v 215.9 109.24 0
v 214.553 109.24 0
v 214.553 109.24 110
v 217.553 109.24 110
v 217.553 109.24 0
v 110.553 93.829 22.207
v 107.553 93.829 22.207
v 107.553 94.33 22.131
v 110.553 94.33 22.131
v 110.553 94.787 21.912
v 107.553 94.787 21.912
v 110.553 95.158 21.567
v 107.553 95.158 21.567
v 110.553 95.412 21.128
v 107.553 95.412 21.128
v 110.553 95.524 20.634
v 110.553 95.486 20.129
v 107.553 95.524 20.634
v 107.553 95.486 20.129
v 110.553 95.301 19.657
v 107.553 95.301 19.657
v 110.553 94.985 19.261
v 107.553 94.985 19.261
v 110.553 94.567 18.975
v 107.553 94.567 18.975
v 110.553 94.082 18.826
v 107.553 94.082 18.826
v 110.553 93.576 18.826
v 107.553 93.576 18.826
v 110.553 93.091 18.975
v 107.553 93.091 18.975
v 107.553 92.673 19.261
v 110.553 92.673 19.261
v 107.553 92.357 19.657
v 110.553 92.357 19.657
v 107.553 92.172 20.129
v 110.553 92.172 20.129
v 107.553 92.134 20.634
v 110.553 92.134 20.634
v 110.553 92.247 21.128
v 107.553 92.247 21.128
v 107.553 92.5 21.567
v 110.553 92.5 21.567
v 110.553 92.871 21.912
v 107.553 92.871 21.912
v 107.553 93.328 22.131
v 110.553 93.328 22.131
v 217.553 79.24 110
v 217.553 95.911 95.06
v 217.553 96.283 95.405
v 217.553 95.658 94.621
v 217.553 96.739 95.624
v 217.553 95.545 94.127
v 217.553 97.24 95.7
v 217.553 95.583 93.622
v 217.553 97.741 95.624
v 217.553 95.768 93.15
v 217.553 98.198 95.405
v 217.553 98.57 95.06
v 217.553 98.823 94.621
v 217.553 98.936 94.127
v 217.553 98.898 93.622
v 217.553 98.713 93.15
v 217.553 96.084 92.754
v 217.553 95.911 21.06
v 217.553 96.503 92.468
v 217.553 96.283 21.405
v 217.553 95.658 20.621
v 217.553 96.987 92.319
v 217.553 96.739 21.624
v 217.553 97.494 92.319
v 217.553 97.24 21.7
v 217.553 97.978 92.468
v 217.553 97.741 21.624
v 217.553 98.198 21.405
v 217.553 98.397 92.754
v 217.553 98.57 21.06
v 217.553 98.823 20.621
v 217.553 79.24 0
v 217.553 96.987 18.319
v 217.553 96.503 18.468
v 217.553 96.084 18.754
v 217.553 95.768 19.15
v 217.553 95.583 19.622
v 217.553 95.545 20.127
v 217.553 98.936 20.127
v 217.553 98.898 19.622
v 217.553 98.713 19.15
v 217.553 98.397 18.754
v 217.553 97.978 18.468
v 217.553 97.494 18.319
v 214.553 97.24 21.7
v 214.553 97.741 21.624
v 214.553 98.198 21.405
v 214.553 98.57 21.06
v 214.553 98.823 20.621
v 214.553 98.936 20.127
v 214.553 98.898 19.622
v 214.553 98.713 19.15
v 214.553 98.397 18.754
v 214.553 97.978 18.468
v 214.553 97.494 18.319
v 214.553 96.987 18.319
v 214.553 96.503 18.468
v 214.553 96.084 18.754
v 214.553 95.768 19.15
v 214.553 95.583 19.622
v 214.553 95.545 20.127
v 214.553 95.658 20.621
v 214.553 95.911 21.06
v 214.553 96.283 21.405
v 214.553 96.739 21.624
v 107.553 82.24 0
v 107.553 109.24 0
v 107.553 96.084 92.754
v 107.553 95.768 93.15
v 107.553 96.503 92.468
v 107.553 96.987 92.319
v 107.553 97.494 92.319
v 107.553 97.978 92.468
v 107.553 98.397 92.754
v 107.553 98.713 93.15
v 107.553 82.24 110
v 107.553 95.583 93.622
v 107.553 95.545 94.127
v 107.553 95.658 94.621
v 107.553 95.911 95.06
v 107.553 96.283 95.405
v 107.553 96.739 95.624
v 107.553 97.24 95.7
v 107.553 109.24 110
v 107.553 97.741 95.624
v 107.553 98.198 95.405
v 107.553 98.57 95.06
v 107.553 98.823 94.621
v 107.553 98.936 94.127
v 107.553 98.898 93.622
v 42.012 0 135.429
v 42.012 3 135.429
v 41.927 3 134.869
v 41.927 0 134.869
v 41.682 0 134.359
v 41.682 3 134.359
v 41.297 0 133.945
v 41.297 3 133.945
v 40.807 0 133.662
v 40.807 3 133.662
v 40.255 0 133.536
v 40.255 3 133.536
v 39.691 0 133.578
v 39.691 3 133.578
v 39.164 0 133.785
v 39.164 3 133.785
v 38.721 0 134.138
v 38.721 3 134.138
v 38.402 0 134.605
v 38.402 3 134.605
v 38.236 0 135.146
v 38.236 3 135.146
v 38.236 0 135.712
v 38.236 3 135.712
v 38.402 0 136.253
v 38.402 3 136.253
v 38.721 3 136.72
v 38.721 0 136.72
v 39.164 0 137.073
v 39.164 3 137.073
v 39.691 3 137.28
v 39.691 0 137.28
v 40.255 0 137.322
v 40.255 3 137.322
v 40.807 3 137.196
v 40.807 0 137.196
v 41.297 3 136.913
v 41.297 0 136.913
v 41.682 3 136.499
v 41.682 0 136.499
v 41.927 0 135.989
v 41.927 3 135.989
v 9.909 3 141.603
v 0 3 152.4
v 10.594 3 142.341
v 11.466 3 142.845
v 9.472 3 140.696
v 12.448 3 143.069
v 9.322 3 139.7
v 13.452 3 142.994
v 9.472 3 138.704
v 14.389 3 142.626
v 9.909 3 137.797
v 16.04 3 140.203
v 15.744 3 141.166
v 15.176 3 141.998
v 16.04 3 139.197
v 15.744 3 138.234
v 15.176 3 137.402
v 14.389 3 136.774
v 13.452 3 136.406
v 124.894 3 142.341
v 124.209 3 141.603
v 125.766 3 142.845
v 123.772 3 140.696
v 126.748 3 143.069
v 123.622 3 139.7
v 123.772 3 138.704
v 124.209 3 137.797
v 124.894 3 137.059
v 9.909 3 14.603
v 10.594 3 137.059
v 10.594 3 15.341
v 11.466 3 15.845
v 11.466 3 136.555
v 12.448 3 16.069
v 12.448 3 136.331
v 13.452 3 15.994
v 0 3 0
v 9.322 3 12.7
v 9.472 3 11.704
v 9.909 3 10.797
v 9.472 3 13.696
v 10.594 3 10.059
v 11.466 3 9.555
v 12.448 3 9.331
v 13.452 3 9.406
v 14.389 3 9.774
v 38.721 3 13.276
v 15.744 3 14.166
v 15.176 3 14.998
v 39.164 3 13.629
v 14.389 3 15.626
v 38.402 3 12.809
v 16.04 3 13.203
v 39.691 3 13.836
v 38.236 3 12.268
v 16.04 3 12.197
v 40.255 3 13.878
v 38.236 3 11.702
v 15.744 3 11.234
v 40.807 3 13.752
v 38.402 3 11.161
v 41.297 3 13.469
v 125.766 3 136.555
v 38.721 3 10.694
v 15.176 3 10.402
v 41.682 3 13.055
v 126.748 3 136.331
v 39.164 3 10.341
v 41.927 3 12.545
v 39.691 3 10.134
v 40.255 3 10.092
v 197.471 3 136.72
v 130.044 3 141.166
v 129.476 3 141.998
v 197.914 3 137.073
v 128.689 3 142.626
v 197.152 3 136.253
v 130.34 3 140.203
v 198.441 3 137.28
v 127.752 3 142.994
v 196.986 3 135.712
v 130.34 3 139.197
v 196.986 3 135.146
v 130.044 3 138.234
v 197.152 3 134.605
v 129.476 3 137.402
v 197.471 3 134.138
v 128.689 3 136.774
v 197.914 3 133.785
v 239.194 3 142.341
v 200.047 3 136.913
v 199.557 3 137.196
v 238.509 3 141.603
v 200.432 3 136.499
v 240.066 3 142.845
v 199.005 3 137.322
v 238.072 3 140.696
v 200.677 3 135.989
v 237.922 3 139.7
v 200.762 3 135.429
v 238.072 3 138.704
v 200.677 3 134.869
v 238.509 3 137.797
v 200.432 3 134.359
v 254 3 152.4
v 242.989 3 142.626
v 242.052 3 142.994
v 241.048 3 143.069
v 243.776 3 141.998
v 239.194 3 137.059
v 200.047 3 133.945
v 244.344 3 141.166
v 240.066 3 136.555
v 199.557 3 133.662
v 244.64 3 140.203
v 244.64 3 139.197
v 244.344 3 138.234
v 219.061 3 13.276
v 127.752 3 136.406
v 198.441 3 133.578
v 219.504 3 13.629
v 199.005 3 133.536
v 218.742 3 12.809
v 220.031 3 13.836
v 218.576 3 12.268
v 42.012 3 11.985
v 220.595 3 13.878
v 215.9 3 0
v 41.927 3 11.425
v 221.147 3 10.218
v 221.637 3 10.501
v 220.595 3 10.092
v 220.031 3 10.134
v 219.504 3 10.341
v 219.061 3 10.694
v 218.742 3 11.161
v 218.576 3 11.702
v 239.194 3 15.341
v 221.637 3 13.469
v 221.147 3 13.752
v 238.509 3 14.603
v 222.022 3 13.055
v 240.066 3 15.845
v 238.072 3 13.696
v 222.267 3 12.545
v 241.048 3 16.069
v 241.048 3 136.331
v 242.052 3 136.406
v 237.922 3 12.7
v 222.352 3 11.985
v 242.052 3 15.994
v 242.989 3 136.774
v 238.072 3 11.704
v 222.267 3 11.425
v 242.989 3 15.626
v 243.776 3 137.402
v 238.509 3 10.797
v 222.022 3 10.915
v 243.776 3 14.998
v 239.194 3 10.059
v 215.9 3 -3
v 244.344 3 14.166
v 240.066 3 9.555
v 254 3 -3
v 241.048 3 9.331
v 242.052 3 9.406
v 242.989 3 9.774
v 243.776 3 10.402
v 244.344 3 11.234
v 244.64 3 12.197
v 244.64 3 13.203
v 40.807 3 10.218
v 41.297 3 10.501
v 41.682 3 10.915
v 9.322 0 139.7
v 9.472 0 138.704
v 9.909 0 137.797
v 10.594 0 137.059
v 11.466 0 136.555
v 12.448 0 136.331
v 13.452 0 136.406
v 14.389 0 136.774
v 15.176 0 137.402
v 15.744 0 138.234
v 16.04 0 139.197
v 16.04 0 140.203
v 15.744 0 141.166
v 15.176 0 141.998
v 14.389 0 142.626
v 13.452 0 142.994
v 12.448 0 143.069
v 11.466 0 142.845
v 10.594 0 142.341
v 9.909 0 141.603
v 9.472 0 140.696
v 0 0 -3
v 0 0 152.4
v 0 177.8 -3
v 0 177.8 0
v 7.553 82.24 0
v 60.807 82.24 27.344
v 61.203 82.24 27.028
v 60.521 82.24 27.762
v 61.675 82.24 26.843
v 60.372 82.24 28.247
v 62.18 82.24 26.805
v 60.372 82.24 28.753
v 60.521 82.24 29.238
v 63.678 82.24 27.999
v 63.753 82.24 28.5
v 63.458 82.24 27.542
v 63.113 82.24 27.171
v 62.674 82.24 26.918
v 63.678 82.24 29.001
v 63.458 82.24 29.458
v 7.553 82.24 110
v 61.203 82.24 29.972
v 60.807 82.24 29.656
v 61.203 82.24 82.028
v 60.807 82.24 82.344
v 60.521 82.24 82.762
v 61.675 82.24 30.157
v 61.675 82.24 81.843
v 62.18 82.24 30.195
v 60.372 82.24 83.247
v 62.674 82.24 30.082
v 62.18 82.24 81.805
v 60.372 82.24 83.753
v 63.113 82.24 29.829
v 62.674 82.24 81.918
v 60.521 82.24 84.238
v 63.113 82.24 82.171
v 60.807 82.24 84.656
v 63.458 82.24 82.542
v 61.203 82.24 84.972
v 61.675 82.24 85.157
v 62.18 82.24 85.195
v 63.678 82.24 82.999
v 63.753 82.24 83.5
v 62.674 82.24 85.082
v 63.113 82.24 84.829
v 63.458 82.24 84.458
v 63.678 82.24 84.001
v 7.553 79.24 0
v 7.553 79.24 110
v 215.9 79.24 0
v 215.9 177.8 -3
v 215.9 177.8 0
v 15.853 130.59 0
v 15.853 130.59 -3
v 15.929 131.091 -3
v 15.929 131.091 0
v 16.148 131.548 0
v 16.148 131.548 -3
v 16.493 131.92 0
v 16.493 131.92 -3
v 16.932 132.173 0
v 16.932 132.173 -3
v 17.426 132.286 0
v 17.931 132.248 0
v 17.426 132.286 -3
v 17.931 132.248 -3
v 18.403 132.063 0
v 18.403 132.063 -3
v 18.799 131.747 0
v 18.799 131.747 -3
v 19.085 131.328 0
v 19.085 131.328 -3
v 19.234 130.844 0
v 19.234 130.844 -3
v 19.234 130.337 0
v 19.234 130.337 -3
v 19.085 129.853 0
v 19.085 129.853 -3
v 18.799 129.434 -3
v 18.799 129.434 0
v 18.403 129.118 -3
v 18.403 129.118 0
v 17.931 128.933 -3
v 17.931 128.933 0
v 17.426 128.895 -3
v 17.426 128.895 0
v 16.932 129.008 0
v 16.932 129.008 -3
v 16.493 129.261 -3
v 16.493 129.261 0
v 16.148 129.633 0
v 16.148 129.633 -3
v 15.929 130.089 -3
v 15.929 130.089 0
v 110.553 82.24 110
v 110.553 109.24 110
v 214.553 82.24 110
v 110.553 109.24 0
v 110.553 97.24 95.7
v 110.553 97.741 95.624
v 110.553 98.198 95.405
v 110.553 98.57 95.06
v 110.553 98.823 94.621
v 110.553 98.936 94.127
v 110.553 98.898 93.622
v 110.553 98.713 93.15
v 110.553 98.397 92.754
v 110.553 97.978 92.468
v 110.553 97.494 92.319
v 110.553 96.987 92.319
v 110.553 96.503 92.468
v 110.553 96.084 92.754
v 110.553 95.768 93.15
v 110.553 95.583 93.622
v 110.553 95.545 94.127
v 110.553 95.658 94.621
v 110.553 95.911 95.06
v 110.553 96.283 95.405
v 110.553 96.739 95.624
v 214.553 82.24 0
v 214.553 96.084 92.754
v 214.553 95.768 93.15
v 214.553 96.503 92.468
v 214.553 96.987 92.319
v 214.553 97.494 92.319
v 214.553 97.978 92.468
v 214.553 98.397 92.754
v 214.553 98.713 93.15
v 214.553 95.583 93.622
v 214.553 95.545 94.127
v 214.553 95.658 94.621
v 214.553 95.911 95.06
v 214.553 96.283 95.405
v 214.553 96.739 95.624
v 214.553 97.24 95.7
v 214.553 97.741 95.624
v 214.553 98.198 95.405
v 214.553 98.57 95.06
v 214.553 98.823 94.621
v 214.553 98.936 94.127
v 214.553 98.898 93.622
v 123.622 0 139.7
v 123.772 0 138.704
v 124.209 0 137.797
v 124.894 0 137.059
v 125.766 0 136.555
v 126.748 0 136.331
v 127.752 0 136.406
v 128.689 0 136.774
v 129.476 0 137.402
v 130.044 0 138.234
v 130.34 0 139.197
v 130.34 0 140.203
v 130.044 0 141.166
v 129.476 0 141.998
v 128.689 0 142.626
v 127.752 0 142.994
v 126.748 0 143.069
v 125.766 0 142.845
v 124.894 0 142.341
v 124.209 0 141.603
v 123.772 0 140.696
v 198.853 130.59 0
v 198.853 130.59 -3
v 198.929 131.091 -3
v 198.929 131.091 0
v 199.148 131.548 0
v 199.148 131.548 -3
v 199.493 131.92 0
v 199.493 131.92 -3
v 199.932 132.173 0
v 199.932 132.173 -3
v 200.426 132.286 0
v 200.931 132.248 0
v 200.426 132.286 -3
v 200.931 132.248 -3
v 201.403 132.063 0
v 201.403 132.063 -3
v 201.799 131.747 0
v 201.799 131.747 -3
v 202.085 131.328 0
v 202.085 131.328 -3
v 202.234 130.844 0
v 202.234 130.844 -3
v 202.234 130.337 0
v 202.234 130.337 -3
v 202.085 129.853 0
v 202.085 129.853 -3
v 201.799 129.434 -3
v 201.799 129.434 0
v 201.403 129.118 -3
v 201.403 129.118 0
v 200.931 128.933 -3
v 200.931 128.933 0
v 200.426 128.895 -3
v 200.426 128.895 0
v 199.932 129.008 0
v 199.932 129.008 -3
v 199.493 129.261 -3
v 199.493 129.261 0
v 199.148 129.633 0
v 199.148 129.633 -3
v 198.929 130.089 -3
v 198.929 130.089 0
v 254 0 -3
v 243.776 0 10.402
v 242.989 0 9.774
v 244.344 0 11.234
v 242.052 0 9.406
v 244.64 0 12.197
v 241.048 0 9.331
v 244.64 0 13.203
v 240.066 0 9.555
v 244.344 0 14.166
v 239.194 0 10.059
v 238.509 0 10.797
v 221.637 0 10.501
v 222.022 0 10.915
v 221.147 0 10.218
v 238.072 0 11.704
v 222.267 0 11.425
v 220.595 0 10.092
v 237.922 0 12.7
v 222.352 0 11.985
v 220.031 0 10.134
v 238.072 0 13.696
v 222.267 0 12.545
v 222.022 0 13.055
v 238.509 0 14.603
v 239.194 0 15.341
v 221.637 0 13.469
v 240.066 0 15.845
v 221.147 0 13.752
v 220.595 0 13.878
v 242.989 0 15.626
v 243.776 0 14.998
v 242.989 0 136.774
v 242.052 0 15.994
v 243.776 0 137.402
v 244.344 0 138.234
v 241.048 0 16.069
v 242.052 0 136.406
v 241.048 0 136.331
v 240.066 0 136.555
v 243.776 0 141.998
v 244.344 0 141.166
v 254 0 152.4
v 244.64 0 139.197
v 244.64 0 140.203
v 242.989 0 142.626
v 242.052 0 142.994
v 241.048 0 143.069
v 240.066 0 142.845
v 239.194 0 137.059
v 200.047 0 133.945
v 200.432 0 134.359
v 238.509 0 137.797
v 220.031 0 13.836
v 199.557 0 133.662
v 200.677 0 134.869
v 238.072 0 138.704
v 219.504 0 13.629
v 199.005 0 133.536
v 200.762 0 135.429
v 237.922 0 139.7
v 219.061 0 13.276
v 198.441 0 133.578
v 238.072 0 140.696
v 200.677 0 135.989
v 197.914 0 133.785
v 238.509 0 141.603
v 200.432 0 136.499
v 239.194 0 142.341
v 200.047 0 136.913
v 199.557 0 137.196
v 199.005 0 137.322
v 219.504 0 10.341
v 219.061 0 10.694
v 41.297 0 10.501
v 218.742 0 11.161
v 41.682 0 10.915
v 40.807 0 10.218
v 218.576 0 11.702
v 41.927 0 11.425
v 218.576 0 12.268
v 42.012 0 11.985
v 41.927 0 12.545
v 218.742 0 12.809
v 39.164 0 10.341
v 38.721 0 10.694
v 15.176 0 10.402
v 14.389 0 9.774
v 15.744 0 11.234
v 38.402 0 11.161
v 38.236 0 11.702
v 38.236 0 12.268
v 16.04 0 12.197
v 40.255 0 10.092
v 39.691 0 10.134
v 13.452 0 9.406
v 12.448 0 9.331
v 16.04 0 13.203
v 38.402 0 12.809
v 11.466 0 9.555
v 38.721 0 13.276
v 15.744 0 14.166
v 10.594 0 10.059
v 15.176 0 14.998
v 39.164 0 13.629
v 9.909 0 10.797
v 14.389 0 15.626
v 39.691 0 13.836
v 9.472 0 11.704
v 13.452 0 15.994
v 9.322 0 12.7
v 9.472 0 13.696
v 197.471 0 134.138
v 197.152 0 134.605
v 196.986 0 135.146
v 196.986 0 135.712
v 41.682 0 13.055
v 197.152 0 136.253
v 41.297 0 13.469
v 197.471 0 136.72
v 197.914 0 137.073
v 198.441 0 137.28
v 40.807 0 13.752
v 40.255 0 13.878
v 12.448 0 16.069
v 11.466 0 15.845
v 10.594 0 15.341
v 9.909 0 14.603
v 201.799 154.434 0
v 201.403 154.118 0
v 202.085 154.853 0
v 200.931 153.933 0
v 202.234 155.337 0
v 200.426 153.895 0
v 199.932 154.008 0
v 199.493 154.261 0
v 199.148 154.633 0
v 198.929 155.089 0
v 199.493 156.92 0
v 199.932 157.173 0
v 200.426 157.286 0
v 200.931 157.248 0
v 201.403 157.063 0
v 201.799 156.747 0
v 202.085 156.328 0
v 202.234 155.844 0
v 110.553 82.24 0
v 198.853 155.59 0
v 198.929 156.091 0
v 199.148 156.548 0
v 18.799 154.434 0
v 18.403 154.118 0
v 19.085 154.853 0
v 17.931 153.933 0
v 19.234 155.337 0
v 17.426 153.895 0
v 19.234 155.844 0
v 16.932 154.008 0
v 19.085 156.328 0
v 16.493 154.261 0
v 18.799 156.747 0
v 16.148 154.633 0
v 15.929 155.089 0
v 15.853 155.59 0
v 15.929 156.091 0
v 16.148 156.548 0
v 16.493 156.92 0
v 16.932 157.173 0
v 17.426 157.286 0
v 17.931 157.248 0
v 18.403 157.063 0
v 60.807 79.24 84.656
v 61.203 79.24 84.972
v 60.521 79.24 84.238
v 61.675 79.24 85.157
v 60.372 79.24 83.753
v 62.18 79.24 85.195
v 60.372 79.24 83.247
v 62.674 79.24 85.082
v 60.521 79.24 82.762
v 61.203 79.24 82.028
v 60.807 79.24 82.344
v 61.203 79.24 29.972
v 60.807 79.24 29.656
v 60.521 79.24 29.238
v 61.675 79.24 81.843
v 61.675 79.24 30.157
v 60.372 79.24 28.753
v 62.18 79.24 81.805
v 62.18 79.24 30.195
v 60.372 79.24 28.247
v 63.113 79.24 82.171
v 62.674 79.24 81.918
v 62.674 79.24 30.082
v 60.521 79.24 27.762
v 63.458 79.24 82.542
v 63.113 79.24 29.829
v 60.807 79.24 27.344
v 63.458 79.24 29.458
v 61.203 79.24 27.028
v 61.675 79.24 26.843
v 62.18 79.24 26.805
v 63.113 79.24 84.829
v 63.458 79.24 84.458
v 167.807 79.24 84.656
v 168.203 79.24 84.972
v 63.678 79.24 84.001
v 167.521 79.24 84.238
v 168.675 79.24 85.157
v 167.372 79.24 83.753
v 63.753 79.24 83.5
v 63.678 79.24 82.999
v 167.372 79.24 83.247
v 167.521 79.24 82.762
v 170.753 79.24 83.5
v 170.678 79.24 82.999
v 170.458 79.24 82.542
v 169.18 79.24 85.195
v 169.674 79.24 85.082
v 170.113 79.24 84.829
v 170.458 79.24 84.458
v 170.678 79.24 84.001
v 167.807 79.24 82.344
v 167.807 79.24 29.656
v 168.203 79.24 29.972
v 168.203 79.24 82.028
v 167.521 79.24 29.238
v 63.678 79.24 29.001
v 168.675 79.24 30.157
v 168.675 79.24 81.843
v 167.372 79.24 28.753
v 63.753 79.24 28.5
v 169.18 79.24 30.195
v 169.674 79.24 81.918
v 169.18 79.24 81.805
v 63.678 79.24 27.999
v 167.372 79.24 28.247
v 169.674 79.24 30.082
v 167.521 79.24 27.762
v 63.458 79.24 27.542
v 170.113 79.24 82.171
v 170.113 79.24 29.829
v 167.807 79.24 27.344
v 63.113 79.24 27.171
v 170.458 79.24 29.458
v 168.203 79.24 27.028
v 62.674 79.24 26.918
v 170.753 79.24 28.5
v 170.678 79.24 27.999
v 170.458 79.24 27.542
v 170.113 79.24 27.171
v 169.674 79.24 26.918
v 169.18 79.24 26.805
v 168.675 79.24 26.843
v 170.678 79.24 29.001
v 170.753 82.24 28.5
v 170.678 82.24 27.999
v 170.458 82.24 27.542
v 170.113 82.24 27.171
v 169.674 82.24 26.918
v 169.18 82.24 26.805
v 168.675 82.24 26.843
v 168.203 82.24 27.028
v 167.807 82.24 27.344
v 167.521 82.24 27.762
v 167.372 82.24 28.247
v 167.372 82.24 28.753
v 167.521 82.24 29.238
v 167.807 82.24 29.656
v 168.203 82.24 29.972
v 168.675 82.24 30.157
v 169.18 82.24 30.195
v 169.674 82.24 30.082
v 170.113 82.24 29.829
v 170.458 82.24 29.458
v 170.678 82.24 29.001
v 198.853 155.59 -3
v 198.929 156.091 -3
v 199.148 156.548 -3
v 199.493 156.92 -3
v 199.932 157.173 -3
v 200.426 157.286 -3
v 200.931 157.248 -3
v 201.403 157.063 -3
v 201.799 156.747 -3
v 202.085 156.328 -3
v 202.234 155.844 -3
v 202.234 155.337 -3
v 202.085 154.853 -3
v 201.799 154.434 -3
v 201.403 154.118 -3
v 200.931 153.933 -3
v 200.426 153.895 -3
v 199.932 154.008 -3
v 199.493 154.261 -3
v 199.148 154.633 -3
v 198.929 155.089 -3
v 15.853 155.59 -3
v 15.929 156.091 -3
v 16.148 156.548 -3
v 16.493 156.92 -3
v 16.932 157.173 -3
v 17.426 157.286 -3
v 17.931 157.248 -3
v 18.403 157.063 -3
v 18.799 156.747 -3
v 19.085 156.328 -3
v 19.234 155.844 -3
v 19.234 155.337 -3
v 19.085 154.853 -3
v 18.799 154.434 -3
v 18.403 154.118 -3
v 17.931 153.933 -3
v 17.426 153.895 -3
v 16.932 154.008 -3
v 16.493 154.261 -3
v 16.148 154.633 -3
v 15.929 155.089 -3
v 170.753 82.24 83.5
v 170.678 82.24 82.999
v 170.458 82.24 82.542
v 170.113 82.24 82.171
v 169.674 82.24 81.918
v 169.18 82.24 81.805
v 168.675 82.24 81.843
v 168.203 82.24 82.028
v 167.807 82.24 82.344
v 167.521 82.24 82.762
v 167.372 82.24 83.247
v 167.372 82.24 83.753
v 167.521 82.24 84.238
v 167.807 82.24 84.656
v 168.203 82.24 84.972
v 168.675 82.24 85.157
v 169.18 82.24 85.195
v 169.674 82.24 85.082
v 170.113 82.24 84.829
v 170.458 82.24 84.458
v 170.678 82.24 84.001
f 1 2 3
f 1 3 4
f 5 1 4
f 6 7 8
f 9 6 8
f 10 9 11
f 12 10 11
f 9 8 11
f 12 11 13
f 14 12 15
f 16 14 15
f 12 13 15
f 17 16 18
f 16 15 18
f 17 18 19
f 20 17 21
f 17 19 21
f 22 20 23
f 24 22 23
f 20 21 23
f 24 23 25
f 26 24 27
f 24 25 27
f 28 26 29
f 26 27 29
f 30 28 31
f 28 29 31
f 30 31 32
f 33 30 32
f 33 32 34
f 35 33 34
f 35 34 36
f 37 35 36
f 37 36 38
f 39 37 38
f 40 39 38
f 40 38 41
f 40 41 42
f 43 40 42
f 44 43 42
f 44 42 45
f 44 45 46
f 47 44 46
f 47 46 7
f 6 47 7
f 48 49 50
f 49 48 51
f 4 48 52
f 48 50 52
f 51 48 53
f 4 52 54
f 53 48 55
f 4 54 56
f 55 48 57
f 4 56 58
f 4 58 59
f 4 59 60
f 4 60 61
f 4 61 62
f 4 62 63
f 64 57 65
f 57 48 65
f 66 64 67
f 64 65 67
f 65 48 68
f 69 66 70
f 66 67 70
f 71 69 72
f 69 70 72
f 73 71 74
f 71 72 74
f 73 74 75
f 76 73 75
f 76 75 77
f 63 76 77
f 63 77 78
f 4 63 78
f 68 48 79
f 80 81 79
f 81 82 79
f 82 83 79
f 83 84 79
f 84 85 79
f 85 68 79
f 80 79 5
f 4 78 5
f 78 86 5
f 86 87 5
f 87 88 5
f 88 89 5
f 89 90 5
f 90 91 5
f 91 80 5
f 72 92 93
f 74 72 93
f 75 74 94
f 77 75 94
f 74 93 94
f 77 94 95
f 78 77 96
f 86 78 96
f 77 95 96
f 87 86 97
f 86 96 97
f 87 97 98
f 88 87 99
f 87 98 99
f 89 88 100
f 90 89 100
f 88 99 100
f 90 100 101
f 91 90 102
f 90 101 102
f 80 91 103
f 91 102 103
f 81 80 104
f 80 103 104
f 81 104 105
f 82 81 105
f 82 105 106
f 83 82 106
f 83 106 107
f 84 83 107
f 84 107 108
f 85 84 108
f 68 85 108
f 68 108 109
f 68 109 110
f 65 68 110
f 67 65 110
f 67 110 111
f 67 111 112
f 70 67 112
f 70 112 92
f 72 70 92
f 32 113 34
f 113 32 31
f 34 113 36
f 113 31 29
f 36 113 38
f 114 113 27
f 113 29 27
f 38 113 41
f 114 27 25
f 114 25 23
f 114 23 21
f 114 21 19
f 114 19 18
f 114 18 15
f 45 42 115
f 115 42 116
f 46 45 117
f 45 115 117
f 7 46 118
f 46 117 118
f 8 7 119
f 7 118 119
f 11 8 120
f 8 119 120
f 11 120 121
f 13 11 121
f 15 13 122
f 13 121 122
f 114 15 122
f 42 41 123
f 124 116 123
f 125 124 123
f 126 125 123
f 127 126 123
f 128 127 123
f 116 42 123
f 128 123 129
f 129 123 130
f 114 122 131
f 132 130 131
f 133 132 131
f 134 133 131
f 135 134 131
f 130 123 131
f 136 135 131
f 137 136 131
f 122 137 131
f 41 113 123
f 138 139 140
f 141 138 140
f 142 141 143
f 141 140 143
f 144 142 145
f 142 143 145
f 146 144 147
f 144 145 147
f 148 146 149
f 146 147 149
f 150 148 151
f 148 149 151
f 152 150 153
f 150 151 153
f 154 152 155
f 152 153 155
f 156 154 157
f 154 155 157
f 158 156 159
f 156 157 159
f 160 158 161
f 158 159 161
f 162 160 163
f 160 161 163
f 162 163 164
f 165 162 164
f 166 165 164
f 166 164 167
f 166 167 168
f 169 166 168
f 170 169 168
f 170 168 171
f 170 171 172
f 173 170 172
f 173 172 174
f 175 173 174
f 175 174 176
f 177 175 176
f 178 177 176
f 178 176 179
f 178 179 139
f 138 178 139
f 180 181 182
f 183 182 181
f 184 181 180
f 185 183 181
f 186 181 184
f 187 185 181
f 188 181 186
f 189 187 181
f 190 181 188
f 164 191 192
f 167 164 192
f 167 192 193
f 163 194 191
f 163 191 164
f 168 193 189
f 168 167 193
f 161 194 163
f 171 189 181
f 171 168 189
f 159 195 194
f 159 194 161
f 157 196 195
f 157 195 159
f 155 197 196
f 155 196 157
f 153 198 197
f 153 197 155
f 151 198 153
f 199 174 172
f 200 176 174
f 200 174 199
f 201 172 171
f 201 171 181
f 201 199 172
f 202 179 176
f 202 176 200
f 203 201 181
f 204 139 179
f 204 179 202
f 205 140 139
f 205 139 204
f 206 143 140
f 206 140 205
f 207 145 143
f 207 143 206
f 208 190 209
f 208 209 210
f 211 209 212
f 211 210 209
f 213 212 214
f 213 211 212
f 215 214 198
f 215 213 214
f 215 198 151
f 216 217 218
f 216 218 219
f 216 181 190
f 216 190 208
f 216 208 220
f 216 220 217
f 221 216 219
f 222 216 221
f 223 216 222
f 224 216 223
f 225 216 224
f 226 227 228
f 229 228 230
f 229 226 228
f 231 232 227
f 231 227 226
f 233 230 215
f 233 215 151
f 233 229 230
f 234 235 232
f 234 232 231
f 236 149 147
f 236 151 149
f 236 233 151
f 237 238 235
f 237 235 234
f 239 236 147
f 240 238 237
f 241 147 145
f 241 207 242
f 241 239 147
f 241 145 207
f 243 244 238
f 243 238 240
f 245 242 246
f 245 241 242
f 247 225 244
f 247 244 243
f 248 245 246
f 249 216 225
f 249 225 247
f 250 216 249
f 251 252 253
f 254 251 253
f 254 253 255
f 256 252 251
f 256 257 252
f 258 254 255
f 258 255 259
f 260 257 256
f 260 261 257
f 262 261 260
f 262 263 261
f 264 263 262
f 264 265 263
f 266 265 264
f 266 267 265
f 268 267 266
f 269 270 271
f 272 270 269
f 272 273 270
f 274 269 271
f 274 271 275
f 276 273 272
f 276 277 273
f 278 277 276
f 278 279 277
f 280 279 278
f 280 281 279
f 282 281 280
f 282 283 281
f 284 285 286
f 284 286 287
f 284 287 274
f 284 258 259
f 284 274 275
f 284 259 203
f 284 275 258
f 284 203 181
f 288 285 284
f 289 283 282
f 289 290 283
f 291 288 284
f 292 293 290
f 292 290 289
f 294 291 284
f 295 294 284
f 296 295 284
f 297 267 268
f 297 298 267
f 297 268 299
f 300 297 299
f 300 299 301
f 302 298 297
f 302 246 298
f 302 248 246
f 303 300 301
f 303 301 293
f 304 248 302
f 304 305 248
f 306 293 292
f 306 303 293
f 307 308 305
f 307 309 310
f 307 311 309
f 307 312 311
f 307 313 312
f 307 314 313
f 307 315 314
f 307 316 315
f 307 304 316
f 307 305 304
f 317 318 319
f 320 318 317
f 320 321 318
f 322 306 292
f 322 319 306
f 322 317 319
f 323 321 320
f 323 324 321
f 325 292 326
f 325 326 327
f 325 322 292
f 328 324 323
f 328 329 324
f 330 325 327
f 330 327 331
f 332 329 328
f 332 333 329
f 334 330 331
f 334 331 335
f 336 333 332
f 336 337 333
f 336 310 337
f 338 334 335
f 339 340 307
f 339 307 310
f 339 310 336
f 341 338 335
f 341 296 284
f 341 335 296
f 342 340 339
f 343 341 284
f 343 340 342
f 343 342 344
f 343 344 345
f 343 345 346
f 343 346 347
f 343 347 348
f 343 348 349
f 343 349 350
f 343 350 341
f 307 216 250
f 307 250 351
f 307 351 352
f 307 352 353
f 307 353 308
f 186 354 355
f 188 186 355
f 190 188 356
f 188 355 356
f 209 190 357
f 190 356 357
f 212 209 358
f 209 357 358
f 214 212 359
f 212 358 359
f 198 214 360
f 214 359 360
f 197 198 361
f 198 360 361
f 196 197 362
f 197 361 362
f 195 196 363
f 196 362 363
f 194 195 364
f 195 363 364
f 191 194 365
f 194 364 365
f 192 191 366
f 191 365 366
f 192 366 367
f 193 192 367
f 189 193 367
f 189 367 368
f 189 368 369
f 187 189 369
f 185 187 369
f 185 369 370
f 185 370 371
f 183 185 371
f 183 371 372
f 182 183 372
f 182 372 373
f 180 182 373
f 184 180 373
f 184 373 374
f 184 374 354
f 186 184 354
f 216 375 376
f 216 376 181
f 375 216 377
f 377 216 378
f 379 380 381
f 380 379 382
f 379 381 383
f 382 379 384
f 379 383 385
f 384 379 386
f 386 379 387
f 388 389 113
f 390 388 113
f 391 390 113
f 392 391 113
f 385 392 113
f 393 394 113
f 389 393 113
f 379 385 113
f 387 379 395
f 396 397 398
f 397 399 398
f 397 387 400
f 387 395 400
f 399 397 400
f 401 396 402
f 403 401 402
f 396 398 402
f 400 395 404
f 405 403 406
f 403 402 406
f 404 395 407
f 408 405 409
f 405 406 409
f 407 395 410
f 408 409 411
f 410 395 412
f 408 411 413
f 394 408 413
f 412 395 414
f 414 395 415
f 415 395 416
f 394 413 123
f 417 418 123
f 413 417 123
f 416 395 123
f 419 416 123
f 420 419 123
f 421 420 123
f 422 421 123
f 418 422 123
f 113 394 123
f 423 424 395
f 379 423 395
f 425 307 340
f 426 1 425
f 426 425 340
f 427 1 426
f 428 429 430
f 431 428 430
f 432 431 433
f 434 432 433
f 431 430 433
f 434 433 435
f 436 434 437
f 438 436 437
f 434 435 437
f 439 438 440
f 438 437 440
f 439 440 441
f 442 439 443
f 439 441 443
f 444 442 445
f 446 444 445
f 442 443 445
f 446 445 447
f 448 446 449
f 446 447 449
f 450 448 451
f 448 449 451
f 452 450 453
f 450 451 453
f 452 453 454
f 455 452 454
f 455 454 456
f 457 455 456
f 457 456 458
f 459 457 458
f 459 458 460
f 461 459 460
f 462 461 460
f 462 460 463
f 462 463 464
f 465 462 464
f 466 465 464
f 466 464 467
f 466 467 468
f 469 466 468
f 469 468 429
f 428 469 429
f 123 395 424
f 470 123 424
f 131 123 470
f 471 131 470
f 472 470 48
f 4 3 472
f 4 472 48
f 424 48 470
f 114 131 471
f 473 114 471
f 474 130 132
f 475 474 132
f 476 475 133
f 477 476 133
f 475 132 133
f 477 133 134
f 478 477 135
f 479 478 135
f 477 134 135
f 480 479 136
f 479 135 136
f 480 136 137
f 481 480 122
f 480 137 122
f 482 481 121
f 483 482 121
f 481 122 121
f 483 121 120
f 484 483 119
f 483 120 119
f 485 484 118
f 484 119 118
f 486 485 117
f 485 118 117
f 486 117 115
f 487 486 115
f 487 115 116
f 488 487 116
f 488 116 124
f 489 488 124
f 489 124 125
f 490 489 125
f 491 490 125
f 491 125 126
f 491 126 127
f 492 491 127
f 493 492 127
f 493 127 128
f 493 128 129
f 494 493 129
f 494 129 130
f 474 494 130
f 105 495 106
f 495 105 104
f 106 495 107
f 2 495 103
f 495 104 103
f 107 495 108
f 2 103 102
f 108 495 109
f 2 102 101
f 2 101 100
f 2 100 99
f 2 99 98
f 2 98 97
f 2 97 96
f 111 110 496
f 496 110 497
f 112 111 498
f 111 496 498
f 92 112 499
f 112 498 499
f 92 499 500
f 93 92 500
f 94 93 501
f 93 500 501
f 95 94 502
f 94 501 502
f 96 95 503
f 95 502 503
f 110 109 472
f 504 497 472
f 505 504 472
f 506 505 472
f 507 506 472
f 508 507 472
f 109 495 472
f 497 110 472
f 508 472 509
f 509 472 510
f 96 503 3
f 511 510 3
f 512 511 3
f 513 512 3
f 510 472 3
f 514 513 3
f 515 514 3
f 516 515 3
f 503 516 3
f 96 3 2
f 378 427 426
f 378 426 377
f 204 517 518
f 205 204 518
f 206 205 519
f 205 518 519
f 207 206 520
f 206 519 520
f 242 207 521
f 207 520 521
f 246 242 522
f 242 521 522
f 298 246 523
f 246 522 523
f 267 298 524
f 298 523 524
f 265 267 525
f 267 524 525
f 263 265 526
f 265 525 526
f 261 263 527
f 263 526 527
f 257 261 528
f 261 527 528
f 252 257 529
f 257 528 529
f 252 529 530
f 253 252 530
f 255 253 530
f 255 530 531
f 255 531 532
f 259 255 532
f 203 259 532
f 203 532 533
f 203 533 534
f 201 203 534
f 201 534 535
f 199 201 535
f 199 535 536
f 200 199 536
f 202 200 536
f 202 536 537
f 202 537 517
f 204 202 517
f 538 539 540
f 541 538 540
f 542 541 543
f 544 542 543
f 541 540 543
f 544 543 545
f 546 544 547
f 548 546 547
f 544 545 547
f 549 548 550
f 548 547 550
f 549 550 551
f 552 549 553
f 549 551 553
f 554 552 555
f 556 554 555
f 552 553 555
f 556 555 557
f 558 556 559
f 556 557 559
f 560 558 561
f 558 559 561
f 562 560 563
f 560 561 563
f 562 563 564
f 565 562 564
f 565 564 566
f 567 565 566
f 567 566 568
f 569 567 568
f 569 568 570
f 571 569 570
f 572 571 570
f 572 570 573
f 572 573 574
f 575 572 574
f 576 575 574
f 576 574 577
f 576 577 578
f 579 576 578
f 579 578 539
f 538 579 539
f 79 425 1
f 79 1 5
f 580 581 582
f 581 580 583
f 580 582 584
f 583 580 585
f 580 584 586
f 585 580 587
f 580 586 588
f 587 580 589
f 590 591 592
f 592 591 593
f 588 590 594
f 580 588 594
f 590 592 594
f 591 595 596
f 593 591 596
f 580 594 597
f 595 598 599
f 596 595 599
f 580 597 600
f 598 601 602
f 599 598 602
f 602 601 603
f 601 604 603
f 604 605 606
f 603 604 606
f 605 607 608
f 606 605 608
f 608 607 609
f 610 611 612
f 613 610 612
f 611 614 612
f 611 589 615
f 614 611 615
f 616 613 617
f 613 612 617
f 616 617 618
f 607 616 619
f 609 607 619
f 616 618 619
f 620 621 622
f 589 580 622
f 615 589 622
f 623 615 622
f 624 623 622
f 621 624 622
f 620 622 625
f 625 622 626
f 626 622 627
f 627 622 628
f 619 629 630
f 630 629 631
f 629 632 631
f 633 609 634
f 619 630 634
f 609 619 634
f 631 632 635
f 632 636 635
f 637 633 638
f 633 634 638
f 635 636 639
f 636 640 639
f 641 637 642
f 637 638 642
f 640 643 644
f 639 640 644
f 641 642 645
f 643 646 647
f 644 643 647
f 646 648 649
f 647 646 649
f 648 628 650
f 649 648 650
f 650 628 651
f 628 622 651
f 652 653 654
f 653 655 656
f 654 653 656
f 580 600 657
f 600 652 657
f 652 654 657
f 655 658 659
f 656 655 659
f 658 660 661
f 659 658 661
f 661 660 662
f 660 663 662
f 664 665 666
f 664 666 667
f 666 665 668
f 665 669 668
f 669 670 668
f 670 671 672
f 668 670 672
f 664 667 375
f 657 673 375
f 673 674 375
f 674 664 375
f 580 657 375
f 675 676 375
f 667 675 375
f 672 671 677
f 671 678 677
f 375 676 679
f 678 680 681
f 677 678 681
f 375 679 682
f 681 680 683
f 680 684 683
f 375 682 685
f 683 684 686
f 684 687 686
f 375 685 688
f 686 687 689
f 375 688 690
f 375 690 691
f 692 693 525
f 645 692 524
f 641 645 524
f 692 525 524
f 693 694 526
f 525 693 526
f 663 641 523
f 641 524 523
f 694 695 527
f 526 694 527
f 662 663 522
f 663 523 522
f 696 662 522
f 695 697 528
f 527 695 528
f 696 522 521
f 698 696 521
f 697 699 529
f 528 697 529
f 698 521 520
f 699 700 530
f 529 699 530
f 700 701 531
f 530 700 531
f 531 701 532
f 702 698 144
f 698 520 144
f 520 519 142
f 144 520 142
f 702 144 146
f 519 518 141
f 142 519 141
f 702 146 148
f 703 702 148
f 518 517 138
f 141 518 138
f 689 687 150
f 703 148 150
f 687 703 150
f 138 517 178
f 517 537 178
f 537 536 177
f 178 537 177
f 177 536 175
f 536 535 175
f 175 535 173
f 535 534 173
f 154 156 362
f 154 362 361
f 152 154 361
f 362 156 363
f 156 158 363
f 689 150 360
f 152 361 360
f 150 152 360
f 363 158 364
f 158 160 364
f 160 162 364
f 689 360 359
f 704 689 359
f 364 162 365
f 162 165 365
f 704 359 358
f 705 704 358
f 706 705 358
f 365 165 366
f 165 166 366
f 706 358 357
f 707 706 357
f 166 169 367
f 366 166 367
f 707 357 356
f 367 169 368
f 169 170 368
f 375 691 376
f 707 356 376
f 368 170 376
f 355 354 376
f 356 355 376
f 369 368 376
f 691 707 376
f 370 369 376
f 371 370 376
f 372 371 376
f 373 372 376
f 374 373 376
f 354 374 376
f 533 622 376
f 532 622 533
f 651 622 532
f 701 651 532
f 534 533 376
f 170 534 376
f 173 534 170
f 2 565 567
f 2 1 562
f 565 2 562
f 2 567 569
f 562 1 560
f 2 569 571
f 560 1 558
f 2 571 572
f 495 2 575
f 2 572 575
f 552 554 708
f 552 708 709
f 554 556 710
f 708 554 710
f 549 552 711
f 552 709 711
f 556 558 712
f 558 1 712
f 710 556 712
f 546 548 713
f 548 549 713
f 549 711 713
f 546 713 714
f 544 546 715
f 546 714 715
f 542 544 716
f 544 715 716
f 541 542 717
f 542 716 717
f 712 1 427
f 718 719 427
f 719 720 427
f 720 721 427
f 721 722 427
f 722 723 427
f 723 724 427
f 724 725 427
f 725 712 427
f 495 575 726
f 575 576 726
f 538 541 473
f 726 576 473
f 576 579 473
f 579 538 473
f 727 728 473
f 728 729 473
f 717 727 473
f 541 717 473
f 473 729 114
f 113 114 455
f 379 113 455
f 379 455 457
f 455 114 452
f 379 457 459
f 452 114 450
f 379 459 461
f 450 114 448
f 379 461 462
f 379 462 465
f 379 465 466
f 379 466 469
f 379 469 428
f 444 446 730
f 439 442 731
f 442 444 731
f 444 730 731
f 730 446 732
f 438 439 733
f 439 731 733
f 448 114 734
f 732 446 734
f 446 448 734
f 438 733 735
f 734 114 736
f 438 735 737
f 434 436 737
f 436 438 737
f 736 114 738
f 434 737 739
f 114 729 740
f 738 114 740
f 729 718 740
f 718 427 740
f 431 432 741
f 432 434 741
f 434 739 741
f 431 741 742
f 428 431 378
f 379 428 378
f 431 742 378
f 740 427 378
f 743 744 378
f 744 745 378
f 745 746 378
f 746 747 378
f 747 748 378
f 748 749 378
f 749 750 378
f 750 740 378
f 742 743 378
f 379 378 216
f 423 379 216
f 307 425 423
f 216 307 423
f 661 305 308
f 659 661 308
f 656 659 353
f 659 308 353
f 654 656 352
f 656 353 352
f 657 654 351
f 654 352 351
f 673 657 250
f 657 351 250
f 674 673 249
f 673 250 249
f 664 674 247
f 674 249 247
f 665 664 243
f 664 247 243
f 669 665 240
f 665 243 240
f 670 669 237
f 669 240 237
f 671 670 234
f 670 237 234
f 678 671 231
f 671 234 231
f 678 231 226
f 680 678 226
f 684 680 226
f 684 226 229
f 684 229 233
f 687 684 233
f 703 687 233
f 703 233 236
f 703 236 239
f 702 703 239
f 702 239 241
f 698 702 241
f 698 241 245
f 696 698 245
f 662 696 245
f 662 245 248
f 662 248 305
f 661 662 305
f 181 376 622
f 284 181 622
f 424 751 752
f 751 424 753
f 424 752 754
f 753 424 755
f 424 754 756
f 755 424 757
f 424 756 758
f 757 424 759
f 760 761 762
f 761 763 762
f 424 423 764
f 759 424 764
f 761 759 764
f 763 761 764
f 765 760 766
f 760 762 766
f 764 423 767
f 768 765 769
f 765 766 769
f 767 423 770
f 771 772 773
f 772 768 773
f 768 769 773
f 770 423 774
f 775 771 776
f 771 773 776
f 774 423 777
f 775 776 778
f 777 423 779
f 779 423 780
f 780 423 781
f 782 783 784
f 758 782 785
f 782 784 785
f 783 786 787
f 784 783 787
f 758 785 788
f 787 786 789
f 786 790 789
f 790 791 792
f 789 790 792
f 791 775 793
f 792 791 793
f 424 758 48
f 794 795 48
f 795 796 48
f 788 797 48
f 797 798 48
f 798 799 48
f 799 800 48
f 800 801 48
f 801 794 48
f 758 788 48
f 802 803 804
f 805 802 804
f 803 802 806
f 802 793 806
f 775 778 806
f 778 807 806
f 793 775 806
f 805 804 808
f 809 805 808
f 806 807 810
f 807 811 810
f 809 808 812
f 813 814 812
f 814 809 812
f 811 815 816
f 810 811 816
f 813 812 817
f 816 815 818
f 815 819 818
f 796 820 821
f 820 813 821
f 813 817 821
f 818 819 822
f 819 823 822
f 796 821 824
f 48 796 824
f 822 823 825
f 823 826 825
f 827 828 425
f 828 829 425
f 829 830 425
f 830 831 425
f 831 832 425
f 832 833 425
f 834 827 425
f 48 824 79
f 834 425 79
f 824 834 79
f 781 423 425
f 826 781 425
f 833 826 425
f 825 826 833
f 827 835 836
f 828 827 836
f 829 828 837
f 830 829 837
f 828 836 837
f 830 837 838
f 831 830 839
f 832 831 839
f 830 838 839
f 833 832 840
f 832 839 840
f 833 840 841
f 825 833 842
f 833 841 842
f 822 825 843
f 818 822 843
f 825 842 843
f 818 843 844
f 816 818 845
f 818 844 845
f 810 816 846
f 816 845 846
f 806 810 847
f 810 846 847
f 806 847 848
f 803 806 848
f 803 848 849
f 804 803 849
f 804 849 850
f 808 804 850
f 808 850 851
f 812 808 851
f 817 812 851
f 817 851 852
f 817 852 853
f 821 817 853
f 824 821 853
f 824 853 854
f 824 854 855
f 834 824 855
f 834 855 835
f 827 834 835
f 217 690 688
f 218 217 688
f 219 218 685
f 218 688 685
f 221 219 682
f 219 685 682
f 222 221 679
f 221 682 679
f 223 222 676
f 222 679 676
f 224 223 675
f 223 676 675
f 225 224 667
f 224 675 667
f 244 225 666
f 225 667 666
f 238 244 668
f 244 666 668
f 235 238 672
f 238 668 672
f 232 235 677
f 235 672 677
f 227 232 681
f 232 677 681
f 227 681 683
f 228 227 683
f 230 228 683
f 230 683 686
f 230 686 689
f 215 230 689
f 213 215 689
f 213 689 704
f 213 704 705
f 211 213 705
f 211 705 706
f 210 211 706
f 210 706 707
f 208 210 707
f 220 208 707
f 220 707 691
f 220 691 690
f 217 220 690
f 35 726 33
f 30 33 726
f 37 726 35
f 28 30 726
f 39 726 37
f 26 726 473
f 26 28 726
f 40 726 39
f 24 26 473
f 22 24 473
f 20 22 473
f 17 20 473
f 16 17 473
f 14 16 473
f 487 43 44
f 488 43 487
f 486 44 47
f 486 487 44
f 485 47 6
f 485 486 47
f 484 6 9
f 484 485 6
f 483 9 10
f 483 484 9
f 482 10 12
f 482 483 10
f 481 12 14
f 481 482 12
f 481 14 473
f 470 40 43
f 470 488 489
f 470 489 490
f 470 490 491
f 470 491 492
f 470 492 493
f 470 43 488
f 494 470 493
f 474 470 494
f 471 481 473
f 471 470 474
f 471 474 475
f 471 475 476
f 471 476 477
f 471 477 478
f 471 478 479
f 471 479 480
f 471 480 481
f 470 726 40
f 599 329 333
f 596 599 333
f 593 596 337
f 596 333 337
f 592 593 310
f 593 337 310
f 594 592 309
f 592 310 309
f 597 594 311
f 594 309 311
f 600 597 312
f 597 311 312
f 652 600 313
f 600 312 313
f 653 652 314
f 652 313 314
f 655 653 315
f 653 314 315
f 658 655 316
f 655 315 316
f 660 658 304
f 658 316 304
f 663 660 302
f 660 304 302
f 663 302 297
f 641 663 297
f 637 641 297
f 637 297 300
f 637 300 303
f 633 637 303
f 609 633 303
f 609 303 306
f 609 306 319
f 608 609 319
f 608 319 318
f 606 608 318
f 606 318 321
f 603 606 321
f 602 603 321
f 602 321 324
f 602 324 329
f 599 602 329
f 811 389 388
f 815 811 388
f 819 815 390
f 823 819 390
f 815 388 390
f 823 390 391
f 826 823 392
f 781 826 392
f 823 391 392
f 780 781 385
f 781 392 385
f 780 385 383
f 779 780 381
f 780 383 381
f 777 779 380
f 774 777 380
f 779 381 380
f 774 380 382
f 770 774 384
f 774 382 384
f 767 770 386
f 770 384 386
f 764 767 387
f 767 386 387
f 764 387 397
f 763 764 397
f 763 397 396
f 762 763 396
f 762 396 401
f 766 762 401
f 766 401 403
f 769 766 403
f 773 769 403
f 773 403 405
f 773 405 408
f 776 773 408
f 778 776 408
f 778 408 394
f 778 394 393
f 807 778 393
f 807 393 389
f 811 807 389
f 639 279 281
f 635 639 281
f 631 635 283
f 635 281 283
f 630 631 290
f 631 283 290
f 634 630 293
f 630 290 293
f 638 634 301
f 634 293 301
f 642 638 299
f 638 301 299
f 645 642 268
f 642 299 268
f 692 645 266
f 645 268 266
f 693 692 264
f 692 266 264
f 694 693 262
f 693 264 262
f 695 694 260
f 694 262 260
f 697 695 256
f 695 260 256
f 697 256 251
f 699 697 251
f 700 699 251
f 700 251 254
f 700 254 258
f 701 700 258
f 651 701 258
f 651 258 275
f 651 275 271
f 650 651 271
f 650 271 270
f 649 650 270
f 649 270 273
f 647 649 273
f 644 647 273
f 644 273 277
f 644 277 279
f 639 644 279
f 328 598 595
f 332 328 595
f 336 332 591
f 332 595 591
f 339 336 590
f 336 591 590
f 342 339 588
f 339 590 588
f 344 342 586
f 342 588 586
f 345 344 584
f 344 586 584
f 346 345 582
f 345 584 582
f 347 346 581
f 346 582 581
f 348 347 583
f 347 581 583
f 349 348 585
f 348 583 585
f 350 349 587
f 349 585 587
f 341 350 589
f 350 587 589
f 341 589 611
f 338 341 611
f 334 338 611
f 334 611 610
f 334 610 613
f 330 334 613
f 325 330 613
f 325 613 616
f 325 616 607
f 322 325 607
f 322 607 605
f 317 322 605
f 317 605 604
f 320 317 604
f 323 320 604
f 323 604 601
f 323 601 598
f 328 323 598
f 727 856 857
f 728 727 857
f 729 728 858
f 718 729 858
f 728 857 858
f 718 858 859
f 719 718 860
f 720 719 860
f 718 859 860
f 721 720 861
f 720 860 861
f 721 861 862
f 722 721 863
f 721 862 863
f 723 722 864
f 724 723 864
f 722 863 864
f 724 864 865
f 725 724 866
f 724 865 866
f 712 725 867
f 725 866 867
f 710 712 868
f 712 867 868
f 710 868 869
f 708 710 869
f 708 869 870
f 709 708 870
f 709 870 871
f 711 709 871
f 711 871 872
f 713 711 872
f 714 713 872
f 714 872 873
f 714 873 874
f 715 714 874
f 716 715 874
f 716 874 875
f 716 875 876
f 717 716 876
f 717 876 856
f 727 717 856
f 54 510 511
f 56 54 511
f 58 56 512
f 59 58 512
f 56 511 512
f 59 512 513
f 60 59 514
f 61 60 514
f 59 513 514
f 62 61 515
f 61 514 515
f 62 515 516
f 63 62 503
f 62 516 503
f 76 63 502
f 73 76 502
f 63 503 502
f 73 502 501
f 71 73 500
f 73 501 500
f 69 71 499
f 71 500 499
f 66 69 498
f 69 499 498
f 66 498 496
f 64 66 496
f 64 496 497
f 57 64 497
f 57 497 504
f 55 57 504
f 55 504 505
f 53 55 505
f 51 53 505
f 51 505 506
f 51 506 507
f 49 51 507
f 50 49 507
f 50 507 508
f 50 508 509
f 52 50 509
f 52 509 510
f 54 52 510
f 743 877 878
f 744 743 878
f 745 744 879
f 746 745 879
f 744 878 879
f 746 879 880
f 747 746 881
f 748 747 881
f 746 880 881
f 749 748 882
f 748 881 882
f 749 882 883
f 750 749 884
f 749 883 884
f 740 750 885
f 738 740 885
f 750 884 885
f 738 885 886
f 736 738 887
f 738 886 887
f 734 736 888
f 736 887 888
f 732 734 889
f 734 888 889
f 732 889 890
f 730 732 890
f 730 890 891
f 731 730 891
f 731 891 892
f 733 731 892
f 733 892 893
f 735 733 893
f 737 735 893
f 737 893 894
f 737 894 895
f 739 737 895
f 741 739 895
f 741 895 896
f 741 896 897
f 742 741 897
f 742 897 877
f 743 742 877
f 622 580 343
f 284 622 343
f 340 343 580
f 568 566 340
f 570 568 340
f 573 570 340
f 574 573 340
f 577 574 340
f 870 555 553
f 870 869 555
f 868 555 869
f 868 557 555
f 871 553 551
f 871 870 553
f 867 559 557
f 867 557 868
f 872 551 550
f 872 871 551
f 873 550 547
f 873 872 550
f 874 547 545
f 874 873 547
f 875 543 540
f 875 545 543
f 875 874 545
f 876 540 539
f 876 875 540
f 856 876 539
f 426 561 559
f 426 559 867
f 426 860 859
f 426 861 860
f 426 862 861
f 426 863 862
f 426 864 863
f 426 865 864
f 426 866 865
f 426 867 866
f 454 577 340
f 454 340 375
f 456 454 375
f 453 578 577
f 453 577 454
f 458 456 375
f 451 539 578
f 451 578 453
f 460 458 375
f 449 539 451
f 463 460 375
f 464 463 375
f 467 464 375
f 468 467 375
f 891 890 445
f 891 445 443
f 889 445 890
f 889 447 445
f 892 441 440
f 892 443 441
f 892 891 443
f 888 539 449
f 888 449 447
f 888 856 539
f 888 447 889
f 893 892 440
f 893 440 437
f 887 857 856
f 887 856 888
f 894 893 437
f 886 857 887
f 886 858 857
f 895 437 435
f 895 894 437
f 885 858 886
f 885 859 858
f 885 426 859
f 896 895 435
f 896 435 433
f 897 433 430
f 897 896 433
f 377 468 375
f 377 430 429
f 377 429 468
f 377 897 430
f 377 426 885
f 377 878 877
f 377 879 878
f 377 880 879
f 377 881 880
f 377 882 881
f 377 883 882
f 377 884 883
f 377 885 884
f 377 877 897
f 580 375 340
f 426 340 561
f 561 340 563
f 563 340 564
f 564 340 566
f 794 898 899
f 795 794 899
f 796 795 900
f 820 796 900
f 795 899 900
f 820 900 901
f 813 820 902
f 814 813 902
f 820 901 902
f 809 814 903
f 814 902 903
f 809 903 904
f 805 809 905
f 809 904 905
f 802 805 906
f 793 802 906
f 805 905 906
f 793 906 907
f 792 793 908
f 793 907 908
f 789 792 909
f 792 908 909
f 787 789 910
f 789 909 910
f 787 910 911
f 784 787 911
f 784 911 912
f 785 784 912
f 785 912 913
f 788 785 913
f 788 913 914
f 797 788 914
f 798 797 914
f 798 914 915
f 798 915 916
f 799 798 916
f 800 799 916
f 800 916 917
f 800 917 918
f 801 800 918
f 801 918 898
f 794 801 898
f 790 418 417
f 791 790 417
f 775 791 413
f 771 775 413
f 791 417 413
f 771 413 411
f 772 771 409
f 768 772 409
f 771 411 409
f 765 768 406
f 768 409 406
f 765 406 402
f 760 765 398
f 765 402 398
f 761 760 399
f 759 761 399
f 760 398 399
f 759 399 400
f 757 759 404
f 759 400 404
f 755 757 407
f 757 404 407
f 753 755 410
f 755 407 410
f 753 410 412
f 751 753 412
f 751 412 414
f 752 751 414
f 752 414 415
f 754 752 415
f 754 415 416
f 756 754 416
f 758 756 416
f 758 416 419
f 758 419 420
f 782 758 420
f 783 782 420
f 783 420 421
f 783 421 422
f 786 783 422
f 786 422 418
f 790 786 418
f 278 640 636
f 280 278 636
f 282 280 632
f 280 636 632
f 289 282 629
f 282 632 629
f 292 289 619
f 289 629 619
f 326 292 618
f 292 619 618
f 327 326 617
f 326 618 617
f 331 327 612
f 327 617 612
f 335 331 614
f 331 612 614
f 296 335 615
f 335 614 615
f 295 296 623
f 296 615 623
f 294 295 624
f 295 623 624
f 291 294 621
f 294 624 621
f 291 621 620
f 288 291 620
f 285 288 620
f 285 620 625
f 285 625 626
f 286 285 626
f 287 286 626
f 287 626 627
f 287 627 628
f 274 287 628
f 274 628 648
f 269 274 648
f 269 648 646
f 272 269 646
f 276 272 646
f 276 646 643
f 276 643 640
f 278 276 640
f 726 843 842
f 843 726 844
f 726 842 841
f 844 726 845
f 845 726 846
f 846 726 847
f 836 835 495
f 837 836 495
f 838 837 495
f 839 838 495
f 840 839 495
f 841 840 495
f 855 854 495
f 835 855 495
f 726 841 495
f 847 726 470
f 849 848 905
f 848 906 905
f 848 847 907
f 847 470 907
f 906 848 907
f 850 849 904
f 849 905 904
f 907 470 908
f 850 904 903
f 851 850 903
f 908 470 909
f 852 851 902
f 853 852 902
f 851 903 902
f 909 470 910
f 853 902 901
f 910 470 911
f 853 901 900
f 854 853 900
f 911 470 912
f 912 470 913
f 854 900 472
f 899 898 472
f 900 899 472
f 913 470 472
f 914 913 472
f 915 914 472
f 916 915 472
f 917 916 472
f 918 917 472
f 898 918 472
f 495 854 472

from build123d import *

# Parameters (mm, degrees)
SKETCH1_W                   = 254
SKETCH1_H                   = 152.4
BOSS_EXTRUDE1_DEPTH         = 3
SKETCH2_W                   = 254
SKETCH2_H                   = 177.8
BOSS_EXTRUDE2_DEPTH         = 3
SKETCH3_W                   = 210
SKETCH3_H                   = 30
BOSS_EXTRUDE3_DEPTH         = 110
SKETCH4_W                   = 104
SKETCH4_H                   = 27
SKETCH4_W_2                 = 100
CUT_EXTRUDE1_DEPTH          = 110
F_6_CLEARANCE_HOLE1_D       = 3.7973
F_6_CLEARANCE_HOLE1_DEPTH   = 3
M3_CLEARANCE_HOLE1_D        = 3.4
M3_CLEARANCE_HOLE1_DEPTH    = 3
M3_CLEARANCE_HOLE2_D        = 3.4
M3_CLEARANCE_HOLE2_DEPTH    = 3
M3_CLEARANCE_HOLE3_D        = 3.4
M3_CLEARANCE_HOLE3_DEPTH    = 3
F_1_4_CLEARANCE_HOLE1_D     = 6.7564
F_1_4_CLEARANCE_HOLE1_DEPTH = 3
M3_CLEARANCE_HOLE4_D        = 3.4
CUT_EXTRUDE2_REACH          = 347.477
SKETCH26_W                  = 38.1
SKETCH26_H                  = 174.8


with BuildPart() as part:
    # Sketch1 → Boss-Extrude1 (new body)
    with BuildSketch(Plane(origin=(0, 0, 0), x_dir=(1, 0, 0), z_dir=(0, 1, 0))):
        with Locations((127, -76.2)):
            Rectangle(SKETCH1_W, SKETCH1_H)
    extrude(amount=BOSS_EXTRUDE1_DEPTH)

    # Sketch2 → Boss-Extrude2 (add)
    with BuildSketch(Plane(origin=(0, 0, 0), x_dir=(-1, 0, 0), z_dir=(0, 0, -1))):
        with Locations((-127, 88.9)):
            Rectangle(SKETCH2_W, SKETCH2_H)
    extrude(amount=BOSS_EXTRUDE2_DEPTH)

    # Sketch3 → Boss-Extrude3 (add)
    with BuildSketch(Plane.XY):
        with Locations((112.553077541, 94.2404)):
            Rectangle(SKETCH3_W, SKETCH3_H)
    extrude(amount=BOSS_EXTRUDE3_DEPTH)

    # Sketch4 → Cut-Extrude1 (cut)
    with BuildSketch(Plane.XY.offset(110)):
        with Locations((162.553077541, 95.7404)):
            Rectangle(SKETCH4_W, SKETCH4_H)
        with Locations((57.553077541, 95.7404)):
            Rectangle(SKETCH4_W_2, SKETCH4_H)
    extrude(amount=-CUT_EXTRUDE1_DEPTH, mode=Mode.SUBTRACT)

    # #6 Clearance Hole1
    with Locations(Plane(origin=(0, 0, 0), x_dir=(-1, 0, 0), z_dir=(0, -1, 0))):
        with Locations((-40.113, -11.985), (-40.113, -135.429), (-220.453, -11.985), (-198.863, -135.429)):
            Hole(F_6_CLEARANCE_HOLE1_D / 2, depth=F_6_CLEARANCE_HOLE1_DEPTH)

    # M3 Clearance Hole1
    with Locations(Plane(origin=(0, 79.2404, 0), x_dir=(-1, 0, 0), z_dir=(0, -1, 0))):
        with Locations((-62.053077541, -28.5), (-62.053077541, -83.5), (-169.053077541, -83.5), (-169.053077541, -28.5)):
            Hole(M3_CLEARANCE_HOLE1_D / 2, depth=M3_CLEARANCE_HOLE1_DEPTH)

    # M3 Clearance Hole2
    with Locations(Plane(origin=(110.553077541, 0, 0), x_dir=(0, 0, -1), z_dir=(1, 0, 0))):
        with Locations((-94, 97.2404), (-20.506947641, 93.829062569)):
            Hole(M3_CLEARANCE_HOLE2_D / 2, depth=M3_CLEARANCE_HOLE2_DEPTH)

    # M3 Clearance Hole3
    with Locations(Plane(origin=(217.553077541, 0, 0), x_dir=(0, 0, -1), z_dir=(1, 0, 0))):
        with Locations((-94, 97.2404), (-20, 97.2404)):
            Hole(M3_CLEARANCE_HOLE3_D / 2, depth=M3_CLEARANCE_HOLE3_DEPTH)

    # 1/4 Clearance Hole1
    with Locations(Plane(origin=(0, 3, 0), x_dir=(1, 0, 0), z_dir=(0, 1, 0))):
        with Locations((244.489784516, -272.977286046), (241.3, -139.7), (12.7, -139.7), (12.7, -12.7), (241.3, -12.7), (127, -139.7)):
            Hole(F_1_4_CLEARANCE_HOLE1_D / 2, depth=F_1_4_CLEARANCE_HOLE1_DEPTH)

    # M3 Clearance Hole4 (through all)
    with Locations(Plane.XY):
        with Locations((17.553077541, 155.5904), (17.553077541, 130.5904), (200.553077541, 155.5904), (200.553077541, 130.5904)):
            Hole(M3_CLEARANCE_HOLE4_D / 2)

    # Sketch26 → Cut-Extrude2 (cut, up to next)
    with BuildSketch(Plane.XY, mode=Mode.PRIVATE) as cut_extrude2_sk1:
        with Locations((234.95, 90.4)):
            Rectangle(SKETCH26_W, SKETCH26_H)
    cut_extrude2_tool1 = extrude(cut_extrude2_sk1.sketch, amount=-CUT_EXTRUDE2_REACH, mode=Mode.PRIVATE) & part.part
    add(cut_extrude2_tool1.solids().sort_by_distance((234.95, 90.4, 0))[0], mode=Mode.SUBTRACT)


solid = part.part
